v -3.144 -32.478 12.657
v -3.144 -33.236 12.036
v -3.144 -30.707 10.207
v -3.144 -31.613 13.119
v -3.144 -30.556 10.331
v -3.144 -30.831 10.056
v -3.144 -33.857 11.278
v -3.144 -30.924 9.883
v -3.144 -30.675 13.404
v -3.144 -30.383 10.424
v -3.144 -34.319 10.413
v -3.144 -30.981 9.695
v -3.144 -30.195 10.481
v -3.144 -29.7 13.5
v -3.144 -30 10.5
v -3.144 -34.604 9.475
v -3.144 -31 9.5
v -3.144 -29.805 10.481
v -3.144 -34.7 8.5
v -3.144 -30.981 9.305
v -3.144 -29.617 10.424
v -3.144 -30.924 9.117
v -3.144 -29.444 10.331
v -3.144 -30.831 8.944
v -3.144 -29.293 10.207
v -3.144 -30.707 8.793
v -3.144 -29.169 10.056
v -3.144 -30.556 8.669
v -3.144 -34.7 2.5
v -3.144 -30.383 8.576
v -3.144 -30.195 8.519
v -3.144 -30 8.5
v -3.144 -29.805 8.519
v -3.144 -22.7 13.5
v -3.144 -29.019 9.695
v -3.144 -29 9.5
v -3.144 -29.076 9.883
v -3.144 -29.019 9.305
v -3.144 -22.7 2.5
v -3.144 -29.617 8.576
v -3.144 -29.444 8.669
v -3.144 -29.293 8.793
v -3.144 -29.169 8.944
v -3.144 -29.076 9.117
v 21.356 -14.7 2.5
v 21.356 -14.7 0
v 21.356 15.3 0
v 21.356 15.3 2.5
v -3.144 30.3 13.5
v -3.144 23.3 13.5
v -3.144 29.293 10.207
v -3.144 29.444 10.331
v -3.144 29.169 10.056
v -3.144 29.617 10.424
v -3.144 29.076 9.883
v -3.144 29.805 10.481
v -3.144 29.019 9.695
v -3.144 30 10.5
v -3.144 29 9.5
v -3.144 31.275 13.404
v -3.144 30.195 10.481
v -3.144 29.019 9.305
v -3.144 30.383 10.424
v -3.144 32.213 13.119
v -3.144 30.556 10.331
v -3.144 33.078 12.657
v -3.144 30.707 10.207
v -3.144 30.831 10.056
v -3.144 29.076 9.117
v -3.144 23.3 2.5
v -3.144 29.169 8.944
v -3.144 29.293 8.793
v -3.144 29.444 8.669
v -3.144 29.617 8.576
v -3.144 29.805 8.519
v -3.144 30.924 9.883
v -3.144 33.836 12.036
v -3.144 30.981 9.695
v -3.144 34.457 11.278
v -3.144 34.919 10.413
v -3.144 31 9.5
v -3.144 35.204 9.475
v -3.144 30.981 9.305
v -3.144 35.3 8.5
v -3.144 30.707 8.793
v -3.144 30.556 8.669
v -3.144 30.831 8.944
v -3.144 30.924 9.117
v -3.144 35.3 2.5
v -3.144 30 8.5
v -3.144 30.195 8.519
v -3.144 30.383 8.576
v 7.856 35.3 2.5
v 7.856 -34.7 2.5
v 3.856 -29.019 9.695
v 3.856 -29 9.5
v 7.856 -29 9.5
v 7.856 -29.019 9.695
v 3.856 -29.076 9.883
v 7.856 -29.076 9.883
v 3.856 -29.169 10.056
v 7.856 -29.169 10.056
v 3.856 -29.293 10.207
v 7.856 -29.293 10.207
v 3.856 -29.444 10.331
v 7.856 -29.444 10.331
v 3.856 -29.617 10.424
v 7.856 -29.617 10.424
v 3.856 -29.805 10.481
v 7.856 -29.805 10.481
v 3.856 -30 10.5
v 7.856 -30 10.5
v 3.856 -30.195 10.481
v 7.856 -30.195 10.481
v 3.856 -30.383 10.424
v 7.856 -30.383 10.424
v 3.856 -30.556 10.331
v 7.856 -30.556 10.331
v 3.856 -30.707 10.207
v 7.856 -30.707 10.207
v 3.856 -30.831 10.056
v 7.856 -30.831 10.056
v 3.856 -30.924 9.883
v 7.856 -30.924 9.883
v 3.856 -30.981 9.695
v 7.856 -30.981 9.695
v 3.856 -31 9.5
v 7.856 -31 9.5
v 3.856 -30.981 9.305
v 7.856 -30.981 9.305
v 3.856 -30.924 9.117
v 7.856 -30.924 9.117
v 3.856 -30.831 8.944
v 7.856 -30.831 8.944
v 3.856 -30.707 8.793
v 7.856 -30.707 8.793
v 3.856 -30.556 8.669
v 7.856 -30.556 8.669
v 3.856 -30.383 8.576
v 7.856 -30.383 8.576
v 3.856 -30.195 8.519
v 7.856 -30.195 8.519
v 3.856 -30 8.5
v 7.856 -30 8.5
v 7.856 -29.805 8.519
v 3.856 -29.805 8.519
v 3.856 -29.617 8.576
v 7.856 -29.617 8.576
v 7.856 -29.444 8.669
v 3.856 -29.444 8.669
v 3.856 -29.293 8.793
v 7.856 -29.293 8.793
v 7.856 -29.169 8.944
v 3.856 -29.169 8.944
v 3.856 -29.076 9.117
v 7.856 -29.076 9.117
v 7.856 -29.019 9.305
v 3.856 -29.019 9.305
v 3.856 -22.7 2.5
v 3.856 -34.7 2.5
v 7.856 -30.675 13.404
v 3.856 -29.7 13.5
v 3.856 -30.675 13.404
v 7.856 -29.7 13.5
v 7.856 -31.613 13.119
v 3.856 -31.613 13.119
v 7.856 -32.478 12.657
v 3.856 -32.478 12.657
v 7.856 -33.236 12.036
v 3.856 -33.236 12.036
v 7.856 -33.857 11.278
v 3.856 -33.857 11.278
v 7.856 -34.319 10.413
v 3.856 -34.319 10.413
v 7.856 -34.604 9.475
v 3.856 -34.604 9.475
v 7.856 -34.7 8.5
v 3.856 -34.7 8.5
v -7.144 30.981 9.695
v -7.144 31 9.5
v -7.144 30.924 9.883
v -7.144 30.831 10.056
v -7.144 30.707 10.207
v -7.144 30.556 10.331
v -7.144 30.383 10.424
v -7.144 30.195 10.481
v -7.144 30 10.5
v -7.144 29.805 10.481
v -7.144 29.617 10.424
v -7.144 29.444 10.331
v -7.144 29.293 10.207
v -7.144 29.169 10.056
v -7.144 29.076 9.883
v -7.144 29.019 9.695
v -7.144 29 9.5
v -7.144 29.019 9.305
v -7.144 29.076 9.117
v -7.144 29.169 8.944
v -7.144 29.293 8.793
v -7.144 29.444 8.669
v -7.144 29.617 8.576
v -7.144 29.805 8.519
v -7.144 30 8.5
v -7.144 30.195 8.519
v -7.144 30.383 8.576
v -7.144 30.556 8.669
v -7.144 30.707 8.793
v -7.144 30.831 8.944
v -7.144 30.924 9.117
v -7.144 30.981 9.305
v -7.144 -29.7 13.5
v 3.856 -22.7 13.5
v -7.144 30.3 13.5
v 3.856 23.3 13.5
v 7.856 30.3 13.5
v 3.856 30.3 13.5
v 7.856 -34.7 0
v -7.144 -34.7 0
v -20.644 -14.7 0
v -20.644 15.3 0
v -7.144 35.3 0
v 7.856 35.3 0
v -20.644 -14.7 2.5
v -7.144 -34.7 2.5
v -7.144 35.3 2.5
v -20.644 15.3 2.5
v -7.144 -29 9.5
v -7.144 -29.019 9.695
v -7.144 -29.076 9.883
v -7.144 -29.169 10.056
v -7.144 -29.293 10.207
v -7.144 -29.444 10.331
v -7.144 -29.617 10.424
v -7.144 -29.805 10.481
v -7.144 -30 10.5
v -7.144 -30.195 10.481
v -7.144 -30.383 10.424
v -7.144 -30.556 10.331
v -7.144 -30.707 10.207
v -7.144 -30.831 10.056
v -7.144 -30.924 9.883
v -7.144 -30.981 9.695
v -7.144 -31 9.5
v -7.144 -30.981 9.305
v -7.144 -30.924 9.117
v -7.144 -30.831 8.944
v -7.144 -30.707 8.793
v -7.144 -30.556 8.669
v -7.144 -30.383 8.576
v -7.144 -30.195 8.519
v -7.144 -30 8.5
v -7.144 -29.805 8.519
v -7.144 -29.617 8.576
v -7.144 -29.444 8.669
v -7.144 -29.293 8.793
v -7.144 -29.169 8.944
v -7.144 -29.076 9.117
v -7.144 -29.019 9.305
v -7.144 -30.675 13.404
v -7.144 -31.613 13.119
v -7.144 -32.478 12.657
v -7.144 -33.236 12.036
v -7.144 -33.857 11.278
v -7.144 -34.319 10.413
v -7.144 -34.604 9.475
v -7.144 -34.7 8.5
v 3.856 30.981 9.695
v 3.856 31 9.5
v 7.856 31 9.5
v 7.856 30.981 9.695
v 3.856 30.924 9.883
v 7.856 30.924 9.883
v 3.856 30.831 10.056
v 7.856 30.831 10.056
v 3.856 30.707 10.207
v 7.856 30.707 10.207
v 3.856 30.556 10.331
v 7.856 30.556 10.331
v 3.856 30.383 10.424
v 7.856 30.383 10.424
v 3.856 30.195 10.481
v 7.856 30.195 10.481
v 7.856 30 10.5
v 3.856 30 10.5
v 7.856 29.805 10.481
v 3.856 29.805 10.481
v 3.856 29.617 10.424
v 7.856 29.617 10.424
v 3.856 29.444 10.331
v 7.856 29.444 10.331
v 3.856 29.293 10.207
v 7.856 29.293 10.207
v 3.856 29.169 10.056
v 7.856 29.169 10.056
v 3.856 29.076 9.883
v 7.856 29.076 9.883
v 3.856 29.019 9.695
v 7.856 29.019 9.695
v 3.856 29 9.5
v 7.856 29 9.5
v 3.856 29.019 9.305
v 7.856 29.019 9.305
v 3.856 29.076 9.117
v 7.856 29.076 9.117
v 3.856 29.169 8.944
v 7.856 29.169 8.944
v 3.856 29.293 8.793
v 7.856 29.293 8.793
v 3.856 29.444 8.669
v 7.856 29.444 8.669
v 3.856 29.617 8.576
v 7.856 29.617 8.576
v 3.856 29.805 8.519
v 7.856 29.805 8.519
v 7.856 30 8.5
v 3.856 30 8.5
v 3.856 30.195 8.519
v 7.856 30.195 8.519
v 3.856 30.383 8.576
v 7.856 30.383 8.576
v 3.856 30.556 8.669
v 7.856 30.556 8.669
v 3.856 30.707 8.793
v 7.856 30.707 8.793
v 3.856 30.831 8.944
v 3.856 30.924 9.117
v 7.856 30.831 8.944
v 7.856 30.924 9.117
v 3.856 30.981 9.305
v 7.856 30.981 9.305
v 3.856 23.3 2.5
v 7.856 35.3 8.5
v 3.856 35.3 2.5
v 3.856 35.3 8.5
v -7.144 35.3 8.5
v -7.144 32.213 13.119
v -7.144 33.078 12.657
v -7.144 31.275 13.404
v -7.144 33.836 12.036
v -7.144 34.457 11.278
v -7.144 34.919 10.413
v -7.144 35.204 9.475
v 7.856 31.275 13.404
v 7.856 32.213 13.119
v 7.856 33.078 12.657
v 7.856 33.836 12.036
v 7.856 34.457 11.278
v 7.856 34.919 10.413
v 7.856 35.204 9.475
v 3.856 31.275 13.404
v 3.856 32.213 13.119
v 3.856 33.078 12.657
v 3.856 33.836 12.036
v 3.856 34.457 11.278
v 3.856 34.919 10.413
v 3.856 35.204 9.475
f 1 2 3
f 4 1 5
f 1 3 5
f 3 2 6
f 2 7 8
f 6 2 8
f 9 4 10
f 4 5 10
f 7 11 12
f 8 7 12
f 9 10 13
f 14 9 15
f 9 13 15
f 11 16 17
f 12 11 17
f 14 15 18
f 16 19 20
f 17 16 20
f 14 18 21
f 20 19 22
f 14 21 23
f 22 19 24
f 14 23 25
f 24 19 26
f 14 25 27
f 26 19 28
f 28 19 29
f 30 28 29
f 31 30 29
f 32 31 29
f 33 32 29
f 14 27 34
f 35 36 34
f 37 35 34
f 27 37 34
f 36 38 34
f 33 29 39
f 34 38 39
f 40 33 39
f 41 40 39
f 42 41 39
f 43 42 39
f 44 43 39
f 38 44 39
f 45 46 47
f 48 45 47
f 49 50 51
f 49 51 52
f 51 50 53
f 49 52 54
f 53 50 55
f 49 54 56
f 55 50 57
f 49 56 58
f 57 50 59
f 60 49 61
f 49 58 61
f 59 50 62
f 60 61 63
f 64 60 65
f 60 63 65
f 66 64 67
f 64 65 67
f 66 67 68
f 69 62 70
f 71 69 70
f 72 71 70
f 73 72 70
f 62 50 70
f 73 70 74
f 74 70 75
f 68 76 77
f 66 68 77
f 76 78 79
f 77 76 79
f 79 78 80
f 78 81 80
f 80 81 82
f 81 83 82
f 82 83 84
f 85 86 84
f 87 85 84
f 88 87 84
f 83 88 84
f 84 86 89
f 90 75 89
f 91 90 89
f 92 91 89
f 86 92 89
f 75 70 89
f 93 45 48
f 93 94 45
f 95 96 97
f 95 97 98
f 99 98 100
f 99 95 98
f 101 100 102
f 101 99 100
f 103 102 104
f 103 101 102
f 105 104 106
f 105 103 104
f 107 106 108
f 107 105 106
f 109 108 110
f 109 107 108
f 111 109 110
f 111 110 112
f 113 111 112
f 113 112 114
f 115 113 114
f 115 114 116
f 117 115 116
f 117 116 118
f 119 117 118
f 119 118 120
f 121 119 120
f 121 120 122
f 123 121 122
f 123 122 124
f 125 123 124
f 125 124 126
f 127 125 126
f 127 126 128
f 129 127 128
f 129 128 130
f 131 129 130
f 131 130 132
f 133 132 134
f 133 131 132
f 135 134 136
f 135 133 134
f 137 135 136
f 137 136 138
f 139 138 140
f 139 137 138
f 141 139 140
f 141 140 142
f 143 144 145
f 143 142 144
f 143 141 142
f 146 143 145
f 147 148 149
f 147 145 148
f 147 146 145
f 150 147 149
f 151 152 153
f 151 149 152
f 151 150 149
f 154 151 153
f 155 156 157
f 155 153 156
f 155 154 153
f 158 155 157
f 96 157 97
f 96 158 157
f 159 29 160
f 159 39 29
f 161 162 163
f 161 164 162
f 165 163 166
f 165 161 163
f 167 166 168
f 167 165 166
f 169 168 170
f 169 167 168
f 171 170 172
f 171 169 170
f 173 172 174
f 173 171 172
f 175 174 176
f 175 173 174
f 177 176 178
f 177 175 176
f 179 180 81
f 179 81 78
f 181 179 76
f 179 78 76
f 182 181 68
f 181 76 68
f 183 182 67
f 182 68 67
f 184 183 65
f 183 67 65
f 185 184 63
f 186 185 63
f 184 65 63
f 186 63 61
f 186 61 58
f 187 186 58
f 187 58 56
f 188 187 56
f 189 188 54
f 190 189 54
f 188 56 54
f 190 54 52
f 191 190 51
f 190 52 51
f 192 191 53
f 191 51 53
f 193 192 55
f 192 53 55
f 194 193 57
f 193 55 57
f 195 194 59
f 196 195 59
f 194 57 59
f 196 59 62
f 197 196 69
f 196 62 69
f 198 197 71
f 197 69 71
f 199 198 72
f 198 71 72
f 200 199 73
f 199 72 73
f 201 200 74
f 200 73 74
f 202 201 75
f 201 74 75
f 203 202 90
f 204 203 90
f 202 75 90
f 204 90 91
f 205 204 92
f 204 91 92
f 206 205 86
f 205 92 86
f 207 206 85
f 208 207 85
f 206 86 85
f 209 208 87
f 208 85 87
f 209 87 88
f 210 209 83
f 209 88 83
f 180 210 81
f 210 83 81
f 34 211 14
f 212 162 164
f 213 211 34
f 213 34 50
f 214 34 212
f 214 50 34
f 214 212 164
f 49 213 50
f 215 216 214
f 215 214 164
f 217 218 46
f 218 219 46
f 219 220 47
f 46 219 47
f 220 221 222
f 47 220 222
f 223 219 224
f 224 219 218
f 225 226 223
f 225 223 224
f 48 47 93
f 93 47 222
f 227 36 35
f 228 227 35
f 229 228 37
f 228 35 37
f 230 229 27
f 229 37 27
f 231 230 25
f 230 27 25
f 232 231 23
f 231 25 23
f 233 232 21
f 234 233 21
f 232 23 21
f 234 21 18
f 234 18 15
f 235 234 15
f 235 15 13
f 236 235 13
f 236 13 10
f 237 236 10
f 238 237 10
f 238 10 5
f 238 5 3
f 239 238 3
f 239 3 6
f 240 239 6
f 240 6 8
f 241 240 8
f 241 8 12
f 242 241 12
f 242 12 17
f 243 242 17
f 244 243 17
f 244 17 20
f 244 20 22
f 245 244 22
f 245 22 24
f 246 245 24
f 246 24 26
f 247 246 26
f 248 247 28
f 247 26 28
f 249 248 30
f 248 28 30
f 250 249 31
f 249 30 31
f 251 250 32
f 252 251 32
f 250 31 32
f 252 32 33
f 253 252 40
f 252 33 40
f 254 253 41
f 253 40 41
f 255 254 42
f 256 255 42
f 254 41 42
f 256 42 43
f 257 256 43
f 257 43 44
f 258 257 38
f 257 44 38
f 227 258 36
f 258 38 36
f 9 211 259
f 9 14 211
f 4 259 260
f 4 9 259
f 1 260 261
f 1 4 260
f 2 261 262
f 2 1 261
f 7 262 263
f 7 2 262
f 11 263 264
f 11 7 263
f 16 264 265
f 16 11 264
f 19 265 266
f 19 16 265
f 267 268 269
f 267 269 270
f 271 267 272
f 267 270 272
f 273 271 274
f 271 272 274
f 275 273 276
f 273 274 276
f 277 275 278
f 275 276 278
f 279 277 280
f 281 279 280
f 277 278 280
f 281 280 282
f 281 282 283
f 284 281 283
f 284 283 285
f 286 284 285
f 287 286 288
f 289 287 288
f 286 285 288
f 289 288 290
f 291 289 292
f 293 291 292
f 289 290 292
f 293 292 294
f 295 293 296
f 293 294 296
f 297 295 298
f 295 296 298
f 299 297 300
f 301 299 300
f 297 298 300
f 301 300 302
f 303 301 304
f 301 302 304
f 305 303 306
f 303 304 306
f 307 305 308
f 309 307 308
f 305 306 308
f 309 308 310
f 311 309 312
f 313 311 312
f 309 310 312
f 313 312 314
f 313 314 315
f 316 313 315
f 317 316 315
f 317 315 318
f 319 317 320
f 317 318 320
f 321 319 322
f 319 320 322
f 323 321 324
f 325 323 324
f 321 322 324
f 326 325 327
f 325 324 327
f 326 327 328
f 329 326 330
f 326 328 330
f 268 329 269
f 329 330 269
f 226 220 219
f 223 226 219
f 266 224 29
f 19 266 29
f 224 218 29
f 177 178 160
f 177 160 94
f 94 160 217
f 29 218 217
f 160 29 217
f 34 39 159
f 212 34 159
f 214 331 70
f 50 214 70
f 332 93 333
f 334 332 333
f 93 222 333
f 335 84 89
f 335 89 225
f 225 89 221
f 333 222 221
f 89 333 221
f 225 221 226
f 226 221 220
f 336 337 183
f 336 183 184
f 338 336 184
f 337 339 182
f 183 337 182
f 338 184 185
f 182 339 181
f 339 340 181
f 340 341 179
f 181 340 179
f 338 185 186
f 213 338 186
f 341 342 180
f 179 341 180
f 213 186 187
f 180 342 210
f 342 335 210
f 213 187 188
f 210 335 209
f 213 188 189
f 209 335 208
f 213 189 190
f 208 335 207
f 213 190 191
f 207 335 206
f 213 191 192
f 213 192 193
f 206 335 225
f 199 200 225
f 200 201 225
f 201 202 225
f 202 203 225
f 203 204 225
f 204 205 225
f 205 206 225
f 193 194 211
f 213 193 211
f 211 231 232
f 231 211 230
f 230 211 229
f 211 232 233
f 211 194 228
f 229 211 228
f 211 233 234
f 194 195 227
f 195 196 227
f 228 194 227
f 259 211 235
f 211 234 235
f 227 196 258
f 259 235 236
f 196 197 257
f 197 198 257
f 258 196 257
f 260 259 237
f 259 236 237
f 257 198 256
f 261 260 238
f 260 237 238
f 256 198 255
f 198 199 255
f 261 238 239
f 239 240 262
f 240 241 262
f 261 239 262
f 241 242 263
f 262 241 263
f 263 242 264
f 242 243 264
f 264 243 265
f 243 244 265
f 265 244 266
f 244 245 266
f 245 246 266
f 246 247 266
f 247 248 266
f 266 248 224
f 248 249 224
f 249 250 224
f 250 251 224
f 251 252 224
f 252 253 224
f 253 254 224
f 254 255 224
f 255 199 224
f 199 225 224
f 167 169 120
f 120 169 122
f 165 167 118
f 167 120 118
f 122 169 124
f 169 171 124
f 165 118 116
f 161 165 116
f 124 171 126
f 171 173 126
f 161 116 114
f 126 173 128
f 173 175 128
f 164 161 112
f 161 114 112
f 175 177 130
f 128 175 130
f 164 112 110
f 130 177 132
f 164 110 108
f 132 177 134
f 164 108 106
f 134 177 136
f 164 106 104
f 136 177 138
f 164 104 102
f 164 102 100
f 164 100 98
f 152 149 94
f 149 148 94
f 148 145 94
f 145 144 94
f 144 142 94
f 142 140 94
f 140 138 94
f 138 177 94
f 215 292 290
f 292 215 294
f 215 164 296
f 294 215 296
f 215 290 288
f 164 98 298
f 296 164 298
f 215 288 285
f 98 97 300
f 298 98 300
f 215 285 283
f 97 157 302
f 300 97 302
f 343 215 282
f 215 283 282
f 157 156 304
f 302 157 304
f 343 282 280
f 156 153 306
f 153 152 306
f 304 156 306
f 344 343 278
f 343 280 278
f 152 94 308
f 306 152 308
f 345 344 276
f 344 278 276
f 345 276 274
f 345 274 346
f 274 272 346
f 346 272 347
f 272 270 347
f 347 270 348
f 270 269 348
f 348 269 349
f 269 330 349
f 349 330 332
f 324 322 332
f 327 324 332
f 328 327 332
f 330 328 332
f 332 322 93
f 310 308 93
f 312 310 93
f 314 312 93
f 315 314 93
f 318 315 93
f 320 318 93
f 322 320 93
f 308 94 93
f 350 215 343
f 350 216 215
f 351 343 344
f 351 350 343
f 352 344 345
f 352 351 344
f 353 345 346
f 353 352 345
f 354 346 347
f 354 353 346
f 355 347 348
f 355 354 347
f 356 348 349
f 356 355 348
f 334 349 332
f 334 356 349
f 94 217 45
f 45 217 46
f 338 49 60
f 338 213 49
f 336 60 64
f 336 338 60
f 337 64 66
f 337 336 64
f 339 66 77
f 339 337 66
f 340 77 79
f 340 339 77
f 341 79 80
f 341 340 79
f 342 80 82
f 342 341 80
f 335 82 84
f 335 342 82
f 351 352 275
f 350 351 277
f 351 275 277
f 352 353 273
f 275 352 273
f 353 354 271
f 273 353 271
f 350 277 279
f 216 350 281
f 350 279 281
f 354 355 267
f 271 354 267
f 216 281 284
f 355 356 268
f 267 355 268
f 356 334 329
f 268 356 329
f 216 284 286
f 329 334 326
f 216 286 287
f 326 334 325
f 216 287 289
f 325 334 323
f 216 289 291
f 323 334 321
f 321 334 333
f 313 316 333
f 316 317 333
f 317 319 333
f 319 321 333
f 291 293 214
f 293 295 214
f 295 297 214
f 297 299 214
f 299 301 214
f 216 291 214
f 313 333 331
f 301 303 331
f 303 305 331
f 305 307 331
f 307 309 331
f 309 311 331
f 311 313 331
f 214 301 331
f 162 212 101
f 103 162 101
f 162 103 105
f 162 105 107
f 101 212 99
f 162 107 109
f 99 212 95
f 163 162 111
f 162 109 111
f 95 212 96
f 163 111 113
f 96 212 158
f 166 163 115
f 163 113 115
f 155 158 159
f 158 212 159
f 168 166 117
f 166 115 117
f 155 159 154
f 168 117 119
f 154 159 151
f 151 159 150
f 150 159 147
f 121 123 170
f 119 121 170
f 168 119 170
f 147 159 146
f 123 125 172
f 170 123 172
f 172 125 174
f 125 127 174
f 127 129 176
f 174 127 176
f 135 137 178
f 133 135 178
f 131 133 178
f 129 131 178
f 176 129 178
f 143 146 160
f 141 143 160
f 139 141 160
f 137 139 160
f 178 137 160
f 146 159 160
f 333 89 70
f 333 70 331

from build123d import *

# Parameters (mm, degrees)
F0_W     = 8.5
F0_H     = 24
F0_W_2   = 7
F0_H_2   = 12
F0_W_3   = 5
F1_DEPTH = 2.5
F2_DEPTH = 13.5
F3_R     = 1
F4_DEPTH = 12.5
F5_R     = 5
F6_R     = 5


with BuildPart() as f1:
    # F0 (on Top) → F1 (new body)
    with BuildSketch(Plane.XY):
        with Locations((12.10625, 0.3)):
            Rectangle(F0_W, F0_H)
        Polygon((-3.14375, 35.3), (-7.14375, 35.3), (-7.14375, 15.3), (-7.14375, 12.3), (-7.14375, -11.7), (-7.14375, -14.7), (-7.14375, -34.7), (-3.14375, -34.7), (-3.14375, -22.7), (3.85625, -22.7), (3.85625, -34.7), (7.85625, -34.7), (7.85625, -14.7), (7.85625, -11.7), (7.85625, 12.3), (7.85625, 15.3), (7.85625, 35.3), (3.85625, 35.3), (3.85625, 23.3), (-3.14375, 23.3), align=None)
        with Locations((0.35625, 29.3)):
            Rectangle(F0_W_2, F0_H_2)
        with Locations((0.35625, -28.7)):
            Rectangle(F0_W_2, F0_H_2)
        Polygon((-7.14375, 15.3), (-7.14375, 35.3), (-20.64375, 15.3), align=None)
        Polygon((21.35625, 15.3), (7.85625, 35.3), (7.85625, 15.3), align=None)
        Polygon((-7.14375, -34.7), (-7.14375, -14.7), (-20.64375, -14.7), align=None)
        Polygon((21.35625, -14.7), (7.85625, -14.7), (7.85625, -34.7), align=None)
        with Locations((-18.14375, 0.3)):
            Rectangle(F0_W_3, F0_H)
        with Locations((18.85625, 0.3)):
            Rectangle(F0_W_3, F0_H)
        Polygon((-7.14375, 12.3), (-7.14375, 15.3), (-20.64375, 15.3), (-20.64375, 12.3), (-15.64375, 12.3), align=None)
        Polygon((-7.14375, -14.7), (-7.14375, -11.7), (-15.64375, -11.7), (-20.64375, -11.7), (-20.64375, -14.7), align=None)
        Polygon((21.35625, 15.3), (7.85625, 15.3), (7.85625, 12.3), (16.35625, 12.3), (21.35625, 12.3), align=None)
        Polygon((16.35625, -11.7), (7.85625, -11.7), (7.85625, -14.7), (21.35625, -14.7), (21.35625, -11.7), align=None)
        with Locations((-11.39375, 0.3)):
            Rectangle(F0_W, F0_H)
    extrude(amount=F1_DEPTH)

    # F0 (on Top) → F2 (join)
    with BuildSketch(Plane.XY):
        Polygon((-3.14375, 35.3), (-7.14375, 35.3), (-7.14375, 15.3), (-7.14375, 12.3), (-7.14375, -11.7), (-7.14375, -14.7), (-7.14375, -34.7), (-3.14375, -34.7), (-3.14375, -22.7), (3.85625, -22.7), (3.85625, -34.7), (7.85625, -34.7), (7.85625, -14.7), (7.85625, -11.7), (7.85625, 12.3), (7.85625, 15.3), (7.85625, 35.3), (3.85625, 35.3), (3.85625, 23.3), (-3.14375, 23.3), align=None)
    extrude(amount=F2_DEPTH)

    # F3 (on Right) → F4 (cut, symmetric)
    with BuildSketch(Plane.YZ):
        with Locations((-30, 9.5)):
            Circle(F3_R)
        with Locations((30, 9.5)):
            Circle(F3_R)
    extrude(amount=F4_DEPTH, both=True, mode=Mode.SUBTRACT)

    # F5
    f5_edges = [f1.edges().sort_by_distance(p)[0] for p in [
        (-5.14375, -34.7, 13.5),
        (5.85625, -34.7, 13.5),
    ]]
    fillet(f5_edges, radius=F5_R)

    # F6
    f6_edges = [f1.edges().sort_by_distance(p)[0] for p in [
        (5.85625, 35.3, 13.5),
        (-5.14375, 35.3, 13.5),
    ]]
    fillet(f6_edges, radius=F6_R)


solid = f1.part
